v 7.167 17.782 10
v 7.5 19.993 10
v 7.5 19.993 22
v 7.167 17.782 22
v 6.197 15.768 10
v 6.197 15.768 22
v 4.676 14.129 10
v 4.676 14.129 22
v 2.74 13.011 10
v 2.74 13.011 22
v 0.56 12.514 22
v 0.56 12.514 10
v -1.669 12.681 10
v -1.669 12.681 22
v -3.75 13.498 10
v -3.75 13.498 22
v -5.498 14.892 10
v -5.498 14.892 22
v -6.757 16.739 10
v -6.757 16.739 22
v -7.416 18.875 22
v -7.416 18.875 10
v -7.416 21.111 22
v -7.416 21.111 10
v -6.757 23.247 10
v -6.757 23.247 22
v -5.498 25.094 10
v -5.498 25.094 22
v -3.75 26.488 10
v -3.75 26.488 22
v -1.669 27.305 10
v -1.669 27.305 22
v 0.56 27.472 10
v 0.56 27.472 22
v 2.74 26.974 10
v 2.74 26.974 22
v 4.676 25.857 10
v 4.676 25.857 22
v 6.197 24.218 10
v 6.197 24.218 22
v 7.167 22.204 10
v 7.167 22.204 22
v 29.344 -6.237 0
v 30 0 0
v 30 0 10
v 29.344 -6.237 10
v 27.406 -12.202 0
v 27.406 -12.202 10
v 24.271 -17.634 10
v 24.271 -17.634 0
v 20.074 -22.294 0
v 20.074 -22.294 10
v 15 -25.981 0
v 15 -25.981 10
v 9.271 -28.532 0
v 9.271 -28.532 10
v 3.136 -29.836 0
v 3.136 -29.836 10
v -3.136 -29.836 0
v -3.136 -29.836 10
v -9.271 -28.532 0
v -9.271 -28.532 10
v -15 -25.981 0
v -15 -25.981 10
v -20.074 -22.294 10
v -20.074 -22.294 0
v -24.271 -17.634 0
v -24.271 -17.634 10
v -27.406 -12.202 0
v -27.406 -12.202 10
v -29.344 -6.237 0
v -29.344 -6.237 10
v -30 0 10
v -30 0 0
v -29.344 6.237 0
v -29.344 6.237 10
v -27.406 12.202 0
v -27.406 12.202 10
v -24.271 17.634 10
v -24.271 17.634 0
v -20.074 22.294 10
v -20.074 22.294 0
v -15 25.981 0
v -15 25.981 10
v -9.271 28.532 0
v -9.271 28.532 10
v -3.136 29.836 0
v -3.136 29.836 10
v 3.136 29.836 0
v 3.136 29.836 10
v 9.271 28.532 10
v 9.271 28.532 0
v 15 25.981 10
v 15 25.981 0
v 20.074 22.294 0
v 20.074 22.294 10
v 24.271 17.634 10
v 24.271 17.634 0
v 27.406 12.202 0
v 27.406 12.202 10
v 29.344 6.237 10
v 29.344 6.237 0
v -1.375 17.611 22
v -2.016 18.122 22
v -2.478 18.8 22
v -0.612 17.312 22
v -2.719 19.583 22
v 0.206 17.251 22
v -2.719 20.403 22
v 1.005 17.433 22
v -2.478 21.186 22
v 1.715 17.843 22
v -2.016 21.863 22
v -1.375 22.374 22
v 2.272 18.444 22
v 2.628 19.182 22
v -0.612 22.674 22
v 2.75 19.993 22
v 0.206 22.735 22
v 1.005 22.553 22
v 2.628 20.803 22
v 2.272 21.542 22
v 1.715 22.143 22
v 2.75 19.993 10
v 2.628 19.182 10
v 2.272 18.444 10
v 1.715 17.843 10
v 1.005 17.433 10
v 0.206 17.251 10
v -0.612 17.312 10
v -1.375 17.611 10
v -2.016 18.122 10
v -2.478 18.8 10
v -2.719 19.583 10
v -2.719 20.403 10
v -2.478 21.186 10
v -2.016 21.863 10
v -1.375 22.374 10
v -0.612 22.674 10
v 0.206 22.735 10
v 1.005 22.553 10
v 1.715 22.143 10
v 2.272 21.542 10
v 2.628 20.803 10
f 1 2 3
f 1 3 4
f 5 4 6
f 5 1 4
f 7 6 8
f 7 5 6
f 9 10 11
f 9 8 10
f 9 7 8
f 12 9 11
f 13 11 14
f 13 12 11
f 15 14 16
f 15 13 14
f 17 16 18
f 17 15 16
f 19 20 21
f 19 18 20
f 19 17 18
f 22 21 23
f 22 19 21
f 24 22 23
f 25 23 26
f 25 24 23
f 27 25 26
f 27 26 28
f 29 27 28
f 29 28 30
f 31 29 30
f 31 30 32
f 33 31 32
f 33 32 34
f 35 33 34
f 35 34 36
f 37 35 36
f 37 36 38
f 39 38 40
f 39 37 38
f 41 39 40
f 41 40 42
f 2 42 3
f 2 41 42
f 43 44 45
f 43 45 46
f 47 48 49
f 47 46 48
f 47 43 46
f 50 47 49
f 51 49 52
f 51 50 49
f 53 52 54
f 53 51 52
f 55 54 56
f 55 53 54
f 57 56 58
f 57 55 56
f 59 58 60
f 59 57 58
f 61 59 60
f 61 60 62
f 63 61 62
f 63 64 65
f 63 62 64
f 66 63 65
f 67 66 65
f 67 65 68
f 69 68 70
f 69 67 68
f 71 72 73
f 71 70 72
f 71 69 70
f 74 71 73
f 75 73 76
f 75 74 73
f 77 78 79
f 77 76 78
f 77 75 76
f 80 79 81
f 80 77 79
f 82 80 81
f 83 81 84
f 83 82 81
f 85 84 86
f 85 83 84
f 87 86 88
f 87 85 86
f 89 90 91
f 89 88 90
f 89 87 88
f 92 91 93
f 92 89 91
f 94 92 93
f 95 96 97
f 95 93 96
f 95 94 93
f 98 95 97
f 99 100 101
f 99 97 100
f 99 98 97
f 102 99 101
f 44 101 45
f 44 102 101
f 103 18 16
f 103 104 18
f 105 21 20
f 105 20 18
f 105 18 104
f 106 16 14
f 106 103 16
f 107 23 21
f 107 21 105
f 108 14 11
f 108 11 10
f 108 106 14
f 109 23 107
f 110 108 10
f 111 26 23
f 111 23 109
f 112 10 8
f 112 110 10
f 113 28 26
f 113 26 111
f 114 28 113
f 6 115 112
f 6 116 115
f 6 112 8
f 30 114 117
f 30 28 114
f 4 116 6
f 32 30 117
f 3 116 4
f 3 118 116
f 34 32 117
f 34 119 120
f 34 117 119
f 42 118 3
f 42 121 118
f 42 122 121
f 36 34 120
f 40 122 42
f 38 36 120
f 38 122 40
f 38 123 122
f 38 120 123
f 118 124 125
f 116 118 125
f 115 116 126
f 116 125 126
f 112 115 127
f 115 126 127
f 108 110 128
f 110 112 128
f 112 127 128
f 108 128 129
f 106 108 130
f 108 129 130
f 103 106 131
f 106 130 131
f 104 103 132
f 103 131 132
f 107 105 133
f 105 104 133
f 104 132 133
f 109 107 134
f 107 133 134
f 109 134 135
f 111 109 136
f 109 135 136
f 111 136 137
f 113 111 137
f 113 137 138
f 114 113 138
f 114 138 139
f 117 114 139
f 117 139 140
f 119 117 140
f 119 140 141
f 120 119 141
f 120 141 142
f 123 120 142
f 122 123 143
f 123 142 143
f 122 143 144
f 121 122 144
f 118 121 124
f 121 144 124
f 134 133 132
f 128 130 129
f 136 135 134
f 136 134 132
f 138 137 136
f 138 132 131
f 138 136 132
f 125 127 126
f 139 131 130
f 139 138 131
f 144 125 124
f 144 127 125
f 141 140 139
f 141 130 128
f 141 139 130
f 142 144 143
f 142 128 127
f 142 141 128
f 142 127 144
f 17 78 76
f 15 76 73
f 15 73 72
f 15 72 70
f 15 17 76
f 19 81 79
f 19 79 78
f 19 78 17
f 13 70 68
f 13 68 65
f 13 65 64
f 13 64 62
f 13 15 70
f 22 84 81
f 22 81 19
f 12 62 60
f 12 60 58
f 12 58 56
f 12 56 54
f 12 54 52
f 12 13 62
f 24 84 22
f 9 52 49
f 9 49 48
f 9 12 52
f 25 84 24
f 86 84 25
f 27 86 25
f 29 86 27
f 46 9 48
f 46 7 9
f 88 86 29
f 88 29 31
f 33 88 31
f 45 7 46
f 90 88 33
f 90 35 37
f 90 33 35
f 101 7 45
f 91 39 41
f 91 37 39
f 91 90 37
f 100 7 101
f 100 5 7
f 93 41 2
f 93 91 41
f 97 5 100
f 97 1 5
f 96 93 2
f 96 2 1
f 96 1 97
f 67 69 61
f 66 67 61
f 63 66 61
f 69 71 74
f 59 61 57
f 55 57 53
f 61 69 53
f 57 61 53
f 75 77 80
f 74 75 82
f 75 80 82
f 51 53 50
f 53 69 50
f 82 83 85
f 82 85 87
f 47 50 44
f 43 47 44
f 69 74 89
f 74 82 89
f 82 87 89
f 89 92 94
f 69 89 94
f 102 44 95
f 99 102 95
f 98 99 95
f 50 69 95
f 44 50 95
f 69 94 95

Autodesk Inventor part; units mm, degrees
ref_plane "YZ Plane" through (0, 0, 0) normal (1, 0, 0) x (0, 1, 0)
ref_plane "XZ Plane" through (0, 0, 0) normal (0, 1, 0) x (-1, 0, 0)
ref_plane "XY Plane" through (0, 0, 0) normal (0, 0, 1) x (1, 0, 0)
sketch "Sketch1" plane through (0, 0, 0) normal (0, 0, 1) x (1, 0, 0)
  circle A0 centre (0, 0) radius 30
  dimension "d0" = 60
extrude "Extrusion1" add sketch "Sketch1" along normal blind 10
sketch "Sketch2" plane through (0, 0, 10) normal (0, 0, 1) x (1, 0, 0)
  circle A0 centre (0, 19.9929) radius 7.5
  circle A1 centre (0, 19.9929) radius 2.75
  point P0 (0, 0)
  dimension "d3" = 15
  dimension "d4" = 5.5
extrude "Extrusion2" add sketch "Sketch2" along normal blind 12
properties part number "Disc"
